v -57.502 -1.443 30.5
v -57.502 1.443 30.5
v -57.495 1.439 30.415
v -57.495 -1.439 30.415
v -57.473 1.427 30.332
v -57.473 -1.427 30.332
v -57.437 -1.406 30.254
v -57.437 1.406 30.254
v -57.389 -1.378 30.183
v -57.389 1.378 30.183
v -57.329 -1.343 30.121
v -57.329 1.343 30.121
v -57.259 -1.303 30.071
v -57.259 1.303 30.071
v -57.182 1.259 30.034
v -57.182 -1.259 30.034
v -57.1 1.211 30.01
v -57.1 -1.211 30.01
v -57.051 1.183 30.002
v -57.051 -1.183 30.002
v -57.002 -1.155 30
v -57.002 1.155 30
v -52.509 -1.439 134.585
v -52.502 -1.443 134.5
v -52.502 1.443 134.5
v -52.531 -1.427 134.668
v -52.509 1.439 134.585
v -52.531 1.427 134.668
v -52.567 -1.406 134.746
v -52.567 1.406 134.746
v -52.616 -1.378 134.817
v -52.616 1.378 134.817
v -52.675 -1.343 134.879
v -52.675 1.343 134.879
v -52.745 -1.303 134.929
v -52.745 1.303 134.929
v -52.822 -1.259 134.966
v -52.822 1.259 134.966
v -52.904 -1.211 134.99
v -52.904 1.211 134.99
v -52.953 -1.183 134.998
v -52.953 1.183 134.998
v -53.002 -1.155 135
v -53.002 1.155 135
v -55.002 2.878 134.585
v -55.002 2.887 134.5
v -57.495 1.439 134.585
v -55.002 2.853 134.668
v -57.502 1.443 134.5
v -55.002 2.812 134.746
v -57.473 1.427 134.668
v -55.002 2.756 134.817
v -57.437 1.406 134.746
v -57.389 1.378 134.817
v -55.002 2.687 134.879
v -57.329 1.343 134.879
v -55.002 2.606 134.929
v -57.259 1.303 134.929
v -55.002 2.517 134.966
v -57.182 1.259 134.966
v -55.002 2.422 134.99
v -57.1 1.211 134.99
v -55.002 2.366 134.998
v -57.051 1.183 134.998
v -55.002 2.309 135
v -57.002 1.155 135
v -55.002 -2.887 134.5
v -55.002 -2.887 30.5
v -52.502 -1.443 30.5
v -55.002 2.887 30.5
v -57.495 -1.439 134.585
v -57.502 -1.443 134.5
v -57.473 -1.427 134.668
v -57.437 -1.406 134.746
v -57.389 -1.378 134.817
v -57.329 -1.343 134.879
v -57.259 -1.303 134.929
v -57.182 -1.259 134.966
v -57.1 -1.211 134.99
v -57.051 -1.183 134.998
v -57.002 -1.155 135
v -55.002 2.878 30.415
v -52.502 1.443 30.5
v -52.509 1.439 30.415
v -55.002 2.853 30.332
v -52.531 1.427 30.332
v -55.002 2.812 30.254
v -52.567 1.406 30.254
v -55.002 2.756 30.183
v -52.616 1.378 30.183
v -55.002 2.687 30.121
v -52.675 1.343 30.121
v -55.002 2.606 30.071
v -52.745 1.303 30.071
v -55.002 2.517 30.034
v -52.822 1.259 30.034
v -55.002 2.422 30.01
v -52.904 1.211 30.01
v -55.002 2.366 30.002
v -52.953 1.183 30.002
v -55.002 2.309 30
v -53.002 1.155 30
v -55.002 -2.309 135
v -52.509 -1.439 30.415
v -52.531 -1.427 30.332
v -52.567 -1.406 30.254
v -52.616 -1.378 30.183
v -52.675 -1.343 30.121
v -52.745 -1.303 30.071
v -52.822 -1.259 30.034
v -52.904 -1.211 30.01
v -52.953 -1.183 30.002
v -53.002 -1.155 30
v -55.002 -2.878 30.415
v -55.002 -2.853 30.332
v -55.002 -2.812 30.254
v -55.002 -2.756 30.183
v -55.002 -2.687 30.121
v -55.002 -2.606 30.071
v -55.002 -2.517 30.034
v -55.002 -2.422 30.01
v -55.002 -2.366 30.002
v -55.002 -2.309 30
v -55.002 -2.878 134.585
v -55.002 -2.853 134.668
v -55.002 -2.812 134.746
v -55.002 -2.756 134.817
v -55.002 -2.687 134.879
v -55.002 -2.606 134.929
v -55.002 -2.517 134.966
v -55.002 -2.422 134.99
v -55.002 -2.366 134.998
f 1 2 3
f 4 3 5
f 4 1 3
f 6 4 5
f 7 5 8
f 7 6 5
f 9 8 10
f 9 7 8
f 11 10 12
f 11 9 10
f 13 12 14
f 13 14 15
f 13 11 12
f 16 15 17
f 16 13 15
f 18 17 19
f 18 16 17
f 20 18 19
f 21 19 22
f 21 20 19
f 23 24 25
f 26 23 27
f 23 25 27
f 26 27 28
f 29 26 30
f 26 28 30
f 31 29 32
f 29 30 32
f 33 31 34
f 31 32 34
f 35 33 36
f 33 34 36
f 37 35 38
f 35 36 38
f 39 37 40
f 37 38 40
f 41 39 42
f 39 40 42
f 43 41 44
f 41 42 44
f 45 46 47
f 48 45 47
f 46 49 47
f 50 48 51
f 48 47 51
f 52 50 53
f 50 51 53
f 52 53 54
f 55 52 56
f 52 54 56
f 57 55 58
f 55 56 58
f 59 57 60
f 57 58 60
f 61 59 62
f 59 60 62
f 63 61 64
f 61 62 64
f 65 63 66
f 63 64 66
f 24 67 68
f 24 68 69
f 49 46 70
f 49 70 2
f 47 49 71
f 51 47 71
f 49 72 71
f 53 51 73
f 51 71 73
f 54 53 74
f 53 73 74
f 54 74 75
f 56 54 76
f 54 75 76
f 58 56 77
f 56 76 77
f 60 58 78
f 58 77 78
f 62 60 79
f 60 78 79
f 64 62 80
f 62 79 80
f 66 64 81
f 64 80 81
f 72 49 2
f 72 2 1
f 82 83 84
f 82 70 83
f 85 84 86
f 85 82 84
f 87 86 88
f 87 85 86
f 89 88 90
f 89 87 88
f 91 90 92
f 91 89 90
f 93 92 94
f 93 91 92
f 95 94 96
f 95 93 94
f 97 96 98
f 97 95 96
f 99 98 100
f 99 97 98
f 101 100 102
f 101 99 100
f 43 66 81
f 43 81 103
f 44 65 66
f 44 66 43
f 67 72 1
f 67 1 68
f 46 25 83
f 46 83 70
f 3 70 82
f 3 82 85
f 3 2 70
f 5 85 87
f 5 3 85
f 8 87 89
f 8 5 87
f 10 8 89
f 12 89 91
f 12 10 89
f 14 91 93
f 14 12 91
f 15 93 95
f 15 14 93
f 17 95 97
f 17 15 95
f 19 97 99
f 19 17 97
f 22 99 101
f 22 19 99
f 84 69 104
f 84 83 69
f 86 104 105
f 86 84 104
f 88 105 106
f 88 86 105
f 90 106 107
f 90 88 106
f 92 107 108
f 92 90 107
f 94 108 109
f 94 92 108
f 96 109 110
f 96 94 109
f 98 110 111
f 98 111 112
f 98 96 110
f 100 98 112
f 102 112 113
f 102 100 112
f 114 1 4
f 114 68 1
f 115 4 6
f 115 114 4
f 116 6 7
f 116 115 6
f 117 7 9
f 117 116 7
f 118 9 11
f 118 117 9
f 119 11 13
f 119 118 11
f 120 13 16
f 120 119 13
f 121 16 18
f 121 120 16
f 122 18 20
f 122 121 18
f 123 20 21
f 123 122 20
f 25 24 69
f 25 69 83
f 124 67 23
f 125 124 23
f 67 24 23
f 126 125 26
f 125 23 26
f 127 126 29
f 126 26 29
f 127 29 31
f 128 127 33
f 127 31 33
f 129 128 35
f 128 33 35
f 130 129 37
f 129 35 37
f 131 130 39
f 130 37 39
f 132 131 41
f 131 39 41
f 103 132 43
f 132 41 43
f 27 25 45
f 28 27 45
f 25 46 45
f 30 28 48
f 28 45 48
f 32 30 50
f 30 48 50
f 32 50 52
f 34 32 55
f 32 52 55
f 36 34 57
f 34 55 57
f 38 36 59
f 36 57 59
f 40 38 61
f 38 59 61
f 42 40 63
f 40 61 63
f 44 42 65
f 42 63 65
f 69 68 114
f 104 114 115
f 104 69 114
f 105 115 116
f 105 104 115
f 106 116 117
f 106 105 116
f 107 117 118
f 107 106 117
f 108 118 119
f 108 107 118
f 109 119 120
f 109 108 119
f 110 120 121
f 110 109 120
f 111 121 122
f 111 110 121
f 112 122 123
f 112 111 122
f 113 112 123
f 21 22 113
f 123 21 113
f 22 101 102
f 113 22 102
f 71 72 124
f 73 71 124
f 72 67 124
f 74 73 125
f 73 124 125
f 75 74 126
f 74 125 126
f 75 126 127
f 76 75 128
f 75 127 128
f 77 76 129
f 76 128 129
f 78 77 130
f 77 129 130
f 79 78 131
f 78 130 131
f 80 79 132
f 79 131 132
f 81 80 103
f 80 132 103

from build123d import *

# Parameters (mm, degrees)
RESSALTO_EXTRUS_O1_DEPTH = 105
FILETE1_R                = 0.5


with BuildPart() as part:
    # Esboço1 → Ressalto-extrusão1 (new body)
    with BuildSketch(Plane.XY.offset(135)):
        Polygon((-55.002122675, 2.886751346), (-57.502122675, 1.443375673), (-57.502122675, -1.443375673), (-55.002122675, -2.886751346), (-52.502122675, -1.443375673), (-52.502122675, 1.443375673), align=None)
    extrude(amount=-RESSALTO_EXTRUS_O1_DEPTH)

    # Filete1
    filete1_edges = [part.edges().sort_by_distance(p)[0] for p in [
        (-57.502122675, 0, 30),
        (-56.252122675, -2.165063509, 30),
        (-53.752122675, -2.165063509, 30),
        (-52.502122675, 0, 30),
        (-53.752122675, 2.165063509, 30),
        (-52.502122675, 0, 135),
        (-53.752122675, -2.165063509, 135),
        (-56.252122675, -2.165063509, 135),
        (-57.502122675, 0, 135),
        (-56.252122675, 2.165063509, 135),
        (-53.752122675, 2.165063509, 135),
        (-56.252122675, 2.165063509, 30),
    ]]
    fillet(filete1_edges, radius=FILETE1_R)


solid = part.part
